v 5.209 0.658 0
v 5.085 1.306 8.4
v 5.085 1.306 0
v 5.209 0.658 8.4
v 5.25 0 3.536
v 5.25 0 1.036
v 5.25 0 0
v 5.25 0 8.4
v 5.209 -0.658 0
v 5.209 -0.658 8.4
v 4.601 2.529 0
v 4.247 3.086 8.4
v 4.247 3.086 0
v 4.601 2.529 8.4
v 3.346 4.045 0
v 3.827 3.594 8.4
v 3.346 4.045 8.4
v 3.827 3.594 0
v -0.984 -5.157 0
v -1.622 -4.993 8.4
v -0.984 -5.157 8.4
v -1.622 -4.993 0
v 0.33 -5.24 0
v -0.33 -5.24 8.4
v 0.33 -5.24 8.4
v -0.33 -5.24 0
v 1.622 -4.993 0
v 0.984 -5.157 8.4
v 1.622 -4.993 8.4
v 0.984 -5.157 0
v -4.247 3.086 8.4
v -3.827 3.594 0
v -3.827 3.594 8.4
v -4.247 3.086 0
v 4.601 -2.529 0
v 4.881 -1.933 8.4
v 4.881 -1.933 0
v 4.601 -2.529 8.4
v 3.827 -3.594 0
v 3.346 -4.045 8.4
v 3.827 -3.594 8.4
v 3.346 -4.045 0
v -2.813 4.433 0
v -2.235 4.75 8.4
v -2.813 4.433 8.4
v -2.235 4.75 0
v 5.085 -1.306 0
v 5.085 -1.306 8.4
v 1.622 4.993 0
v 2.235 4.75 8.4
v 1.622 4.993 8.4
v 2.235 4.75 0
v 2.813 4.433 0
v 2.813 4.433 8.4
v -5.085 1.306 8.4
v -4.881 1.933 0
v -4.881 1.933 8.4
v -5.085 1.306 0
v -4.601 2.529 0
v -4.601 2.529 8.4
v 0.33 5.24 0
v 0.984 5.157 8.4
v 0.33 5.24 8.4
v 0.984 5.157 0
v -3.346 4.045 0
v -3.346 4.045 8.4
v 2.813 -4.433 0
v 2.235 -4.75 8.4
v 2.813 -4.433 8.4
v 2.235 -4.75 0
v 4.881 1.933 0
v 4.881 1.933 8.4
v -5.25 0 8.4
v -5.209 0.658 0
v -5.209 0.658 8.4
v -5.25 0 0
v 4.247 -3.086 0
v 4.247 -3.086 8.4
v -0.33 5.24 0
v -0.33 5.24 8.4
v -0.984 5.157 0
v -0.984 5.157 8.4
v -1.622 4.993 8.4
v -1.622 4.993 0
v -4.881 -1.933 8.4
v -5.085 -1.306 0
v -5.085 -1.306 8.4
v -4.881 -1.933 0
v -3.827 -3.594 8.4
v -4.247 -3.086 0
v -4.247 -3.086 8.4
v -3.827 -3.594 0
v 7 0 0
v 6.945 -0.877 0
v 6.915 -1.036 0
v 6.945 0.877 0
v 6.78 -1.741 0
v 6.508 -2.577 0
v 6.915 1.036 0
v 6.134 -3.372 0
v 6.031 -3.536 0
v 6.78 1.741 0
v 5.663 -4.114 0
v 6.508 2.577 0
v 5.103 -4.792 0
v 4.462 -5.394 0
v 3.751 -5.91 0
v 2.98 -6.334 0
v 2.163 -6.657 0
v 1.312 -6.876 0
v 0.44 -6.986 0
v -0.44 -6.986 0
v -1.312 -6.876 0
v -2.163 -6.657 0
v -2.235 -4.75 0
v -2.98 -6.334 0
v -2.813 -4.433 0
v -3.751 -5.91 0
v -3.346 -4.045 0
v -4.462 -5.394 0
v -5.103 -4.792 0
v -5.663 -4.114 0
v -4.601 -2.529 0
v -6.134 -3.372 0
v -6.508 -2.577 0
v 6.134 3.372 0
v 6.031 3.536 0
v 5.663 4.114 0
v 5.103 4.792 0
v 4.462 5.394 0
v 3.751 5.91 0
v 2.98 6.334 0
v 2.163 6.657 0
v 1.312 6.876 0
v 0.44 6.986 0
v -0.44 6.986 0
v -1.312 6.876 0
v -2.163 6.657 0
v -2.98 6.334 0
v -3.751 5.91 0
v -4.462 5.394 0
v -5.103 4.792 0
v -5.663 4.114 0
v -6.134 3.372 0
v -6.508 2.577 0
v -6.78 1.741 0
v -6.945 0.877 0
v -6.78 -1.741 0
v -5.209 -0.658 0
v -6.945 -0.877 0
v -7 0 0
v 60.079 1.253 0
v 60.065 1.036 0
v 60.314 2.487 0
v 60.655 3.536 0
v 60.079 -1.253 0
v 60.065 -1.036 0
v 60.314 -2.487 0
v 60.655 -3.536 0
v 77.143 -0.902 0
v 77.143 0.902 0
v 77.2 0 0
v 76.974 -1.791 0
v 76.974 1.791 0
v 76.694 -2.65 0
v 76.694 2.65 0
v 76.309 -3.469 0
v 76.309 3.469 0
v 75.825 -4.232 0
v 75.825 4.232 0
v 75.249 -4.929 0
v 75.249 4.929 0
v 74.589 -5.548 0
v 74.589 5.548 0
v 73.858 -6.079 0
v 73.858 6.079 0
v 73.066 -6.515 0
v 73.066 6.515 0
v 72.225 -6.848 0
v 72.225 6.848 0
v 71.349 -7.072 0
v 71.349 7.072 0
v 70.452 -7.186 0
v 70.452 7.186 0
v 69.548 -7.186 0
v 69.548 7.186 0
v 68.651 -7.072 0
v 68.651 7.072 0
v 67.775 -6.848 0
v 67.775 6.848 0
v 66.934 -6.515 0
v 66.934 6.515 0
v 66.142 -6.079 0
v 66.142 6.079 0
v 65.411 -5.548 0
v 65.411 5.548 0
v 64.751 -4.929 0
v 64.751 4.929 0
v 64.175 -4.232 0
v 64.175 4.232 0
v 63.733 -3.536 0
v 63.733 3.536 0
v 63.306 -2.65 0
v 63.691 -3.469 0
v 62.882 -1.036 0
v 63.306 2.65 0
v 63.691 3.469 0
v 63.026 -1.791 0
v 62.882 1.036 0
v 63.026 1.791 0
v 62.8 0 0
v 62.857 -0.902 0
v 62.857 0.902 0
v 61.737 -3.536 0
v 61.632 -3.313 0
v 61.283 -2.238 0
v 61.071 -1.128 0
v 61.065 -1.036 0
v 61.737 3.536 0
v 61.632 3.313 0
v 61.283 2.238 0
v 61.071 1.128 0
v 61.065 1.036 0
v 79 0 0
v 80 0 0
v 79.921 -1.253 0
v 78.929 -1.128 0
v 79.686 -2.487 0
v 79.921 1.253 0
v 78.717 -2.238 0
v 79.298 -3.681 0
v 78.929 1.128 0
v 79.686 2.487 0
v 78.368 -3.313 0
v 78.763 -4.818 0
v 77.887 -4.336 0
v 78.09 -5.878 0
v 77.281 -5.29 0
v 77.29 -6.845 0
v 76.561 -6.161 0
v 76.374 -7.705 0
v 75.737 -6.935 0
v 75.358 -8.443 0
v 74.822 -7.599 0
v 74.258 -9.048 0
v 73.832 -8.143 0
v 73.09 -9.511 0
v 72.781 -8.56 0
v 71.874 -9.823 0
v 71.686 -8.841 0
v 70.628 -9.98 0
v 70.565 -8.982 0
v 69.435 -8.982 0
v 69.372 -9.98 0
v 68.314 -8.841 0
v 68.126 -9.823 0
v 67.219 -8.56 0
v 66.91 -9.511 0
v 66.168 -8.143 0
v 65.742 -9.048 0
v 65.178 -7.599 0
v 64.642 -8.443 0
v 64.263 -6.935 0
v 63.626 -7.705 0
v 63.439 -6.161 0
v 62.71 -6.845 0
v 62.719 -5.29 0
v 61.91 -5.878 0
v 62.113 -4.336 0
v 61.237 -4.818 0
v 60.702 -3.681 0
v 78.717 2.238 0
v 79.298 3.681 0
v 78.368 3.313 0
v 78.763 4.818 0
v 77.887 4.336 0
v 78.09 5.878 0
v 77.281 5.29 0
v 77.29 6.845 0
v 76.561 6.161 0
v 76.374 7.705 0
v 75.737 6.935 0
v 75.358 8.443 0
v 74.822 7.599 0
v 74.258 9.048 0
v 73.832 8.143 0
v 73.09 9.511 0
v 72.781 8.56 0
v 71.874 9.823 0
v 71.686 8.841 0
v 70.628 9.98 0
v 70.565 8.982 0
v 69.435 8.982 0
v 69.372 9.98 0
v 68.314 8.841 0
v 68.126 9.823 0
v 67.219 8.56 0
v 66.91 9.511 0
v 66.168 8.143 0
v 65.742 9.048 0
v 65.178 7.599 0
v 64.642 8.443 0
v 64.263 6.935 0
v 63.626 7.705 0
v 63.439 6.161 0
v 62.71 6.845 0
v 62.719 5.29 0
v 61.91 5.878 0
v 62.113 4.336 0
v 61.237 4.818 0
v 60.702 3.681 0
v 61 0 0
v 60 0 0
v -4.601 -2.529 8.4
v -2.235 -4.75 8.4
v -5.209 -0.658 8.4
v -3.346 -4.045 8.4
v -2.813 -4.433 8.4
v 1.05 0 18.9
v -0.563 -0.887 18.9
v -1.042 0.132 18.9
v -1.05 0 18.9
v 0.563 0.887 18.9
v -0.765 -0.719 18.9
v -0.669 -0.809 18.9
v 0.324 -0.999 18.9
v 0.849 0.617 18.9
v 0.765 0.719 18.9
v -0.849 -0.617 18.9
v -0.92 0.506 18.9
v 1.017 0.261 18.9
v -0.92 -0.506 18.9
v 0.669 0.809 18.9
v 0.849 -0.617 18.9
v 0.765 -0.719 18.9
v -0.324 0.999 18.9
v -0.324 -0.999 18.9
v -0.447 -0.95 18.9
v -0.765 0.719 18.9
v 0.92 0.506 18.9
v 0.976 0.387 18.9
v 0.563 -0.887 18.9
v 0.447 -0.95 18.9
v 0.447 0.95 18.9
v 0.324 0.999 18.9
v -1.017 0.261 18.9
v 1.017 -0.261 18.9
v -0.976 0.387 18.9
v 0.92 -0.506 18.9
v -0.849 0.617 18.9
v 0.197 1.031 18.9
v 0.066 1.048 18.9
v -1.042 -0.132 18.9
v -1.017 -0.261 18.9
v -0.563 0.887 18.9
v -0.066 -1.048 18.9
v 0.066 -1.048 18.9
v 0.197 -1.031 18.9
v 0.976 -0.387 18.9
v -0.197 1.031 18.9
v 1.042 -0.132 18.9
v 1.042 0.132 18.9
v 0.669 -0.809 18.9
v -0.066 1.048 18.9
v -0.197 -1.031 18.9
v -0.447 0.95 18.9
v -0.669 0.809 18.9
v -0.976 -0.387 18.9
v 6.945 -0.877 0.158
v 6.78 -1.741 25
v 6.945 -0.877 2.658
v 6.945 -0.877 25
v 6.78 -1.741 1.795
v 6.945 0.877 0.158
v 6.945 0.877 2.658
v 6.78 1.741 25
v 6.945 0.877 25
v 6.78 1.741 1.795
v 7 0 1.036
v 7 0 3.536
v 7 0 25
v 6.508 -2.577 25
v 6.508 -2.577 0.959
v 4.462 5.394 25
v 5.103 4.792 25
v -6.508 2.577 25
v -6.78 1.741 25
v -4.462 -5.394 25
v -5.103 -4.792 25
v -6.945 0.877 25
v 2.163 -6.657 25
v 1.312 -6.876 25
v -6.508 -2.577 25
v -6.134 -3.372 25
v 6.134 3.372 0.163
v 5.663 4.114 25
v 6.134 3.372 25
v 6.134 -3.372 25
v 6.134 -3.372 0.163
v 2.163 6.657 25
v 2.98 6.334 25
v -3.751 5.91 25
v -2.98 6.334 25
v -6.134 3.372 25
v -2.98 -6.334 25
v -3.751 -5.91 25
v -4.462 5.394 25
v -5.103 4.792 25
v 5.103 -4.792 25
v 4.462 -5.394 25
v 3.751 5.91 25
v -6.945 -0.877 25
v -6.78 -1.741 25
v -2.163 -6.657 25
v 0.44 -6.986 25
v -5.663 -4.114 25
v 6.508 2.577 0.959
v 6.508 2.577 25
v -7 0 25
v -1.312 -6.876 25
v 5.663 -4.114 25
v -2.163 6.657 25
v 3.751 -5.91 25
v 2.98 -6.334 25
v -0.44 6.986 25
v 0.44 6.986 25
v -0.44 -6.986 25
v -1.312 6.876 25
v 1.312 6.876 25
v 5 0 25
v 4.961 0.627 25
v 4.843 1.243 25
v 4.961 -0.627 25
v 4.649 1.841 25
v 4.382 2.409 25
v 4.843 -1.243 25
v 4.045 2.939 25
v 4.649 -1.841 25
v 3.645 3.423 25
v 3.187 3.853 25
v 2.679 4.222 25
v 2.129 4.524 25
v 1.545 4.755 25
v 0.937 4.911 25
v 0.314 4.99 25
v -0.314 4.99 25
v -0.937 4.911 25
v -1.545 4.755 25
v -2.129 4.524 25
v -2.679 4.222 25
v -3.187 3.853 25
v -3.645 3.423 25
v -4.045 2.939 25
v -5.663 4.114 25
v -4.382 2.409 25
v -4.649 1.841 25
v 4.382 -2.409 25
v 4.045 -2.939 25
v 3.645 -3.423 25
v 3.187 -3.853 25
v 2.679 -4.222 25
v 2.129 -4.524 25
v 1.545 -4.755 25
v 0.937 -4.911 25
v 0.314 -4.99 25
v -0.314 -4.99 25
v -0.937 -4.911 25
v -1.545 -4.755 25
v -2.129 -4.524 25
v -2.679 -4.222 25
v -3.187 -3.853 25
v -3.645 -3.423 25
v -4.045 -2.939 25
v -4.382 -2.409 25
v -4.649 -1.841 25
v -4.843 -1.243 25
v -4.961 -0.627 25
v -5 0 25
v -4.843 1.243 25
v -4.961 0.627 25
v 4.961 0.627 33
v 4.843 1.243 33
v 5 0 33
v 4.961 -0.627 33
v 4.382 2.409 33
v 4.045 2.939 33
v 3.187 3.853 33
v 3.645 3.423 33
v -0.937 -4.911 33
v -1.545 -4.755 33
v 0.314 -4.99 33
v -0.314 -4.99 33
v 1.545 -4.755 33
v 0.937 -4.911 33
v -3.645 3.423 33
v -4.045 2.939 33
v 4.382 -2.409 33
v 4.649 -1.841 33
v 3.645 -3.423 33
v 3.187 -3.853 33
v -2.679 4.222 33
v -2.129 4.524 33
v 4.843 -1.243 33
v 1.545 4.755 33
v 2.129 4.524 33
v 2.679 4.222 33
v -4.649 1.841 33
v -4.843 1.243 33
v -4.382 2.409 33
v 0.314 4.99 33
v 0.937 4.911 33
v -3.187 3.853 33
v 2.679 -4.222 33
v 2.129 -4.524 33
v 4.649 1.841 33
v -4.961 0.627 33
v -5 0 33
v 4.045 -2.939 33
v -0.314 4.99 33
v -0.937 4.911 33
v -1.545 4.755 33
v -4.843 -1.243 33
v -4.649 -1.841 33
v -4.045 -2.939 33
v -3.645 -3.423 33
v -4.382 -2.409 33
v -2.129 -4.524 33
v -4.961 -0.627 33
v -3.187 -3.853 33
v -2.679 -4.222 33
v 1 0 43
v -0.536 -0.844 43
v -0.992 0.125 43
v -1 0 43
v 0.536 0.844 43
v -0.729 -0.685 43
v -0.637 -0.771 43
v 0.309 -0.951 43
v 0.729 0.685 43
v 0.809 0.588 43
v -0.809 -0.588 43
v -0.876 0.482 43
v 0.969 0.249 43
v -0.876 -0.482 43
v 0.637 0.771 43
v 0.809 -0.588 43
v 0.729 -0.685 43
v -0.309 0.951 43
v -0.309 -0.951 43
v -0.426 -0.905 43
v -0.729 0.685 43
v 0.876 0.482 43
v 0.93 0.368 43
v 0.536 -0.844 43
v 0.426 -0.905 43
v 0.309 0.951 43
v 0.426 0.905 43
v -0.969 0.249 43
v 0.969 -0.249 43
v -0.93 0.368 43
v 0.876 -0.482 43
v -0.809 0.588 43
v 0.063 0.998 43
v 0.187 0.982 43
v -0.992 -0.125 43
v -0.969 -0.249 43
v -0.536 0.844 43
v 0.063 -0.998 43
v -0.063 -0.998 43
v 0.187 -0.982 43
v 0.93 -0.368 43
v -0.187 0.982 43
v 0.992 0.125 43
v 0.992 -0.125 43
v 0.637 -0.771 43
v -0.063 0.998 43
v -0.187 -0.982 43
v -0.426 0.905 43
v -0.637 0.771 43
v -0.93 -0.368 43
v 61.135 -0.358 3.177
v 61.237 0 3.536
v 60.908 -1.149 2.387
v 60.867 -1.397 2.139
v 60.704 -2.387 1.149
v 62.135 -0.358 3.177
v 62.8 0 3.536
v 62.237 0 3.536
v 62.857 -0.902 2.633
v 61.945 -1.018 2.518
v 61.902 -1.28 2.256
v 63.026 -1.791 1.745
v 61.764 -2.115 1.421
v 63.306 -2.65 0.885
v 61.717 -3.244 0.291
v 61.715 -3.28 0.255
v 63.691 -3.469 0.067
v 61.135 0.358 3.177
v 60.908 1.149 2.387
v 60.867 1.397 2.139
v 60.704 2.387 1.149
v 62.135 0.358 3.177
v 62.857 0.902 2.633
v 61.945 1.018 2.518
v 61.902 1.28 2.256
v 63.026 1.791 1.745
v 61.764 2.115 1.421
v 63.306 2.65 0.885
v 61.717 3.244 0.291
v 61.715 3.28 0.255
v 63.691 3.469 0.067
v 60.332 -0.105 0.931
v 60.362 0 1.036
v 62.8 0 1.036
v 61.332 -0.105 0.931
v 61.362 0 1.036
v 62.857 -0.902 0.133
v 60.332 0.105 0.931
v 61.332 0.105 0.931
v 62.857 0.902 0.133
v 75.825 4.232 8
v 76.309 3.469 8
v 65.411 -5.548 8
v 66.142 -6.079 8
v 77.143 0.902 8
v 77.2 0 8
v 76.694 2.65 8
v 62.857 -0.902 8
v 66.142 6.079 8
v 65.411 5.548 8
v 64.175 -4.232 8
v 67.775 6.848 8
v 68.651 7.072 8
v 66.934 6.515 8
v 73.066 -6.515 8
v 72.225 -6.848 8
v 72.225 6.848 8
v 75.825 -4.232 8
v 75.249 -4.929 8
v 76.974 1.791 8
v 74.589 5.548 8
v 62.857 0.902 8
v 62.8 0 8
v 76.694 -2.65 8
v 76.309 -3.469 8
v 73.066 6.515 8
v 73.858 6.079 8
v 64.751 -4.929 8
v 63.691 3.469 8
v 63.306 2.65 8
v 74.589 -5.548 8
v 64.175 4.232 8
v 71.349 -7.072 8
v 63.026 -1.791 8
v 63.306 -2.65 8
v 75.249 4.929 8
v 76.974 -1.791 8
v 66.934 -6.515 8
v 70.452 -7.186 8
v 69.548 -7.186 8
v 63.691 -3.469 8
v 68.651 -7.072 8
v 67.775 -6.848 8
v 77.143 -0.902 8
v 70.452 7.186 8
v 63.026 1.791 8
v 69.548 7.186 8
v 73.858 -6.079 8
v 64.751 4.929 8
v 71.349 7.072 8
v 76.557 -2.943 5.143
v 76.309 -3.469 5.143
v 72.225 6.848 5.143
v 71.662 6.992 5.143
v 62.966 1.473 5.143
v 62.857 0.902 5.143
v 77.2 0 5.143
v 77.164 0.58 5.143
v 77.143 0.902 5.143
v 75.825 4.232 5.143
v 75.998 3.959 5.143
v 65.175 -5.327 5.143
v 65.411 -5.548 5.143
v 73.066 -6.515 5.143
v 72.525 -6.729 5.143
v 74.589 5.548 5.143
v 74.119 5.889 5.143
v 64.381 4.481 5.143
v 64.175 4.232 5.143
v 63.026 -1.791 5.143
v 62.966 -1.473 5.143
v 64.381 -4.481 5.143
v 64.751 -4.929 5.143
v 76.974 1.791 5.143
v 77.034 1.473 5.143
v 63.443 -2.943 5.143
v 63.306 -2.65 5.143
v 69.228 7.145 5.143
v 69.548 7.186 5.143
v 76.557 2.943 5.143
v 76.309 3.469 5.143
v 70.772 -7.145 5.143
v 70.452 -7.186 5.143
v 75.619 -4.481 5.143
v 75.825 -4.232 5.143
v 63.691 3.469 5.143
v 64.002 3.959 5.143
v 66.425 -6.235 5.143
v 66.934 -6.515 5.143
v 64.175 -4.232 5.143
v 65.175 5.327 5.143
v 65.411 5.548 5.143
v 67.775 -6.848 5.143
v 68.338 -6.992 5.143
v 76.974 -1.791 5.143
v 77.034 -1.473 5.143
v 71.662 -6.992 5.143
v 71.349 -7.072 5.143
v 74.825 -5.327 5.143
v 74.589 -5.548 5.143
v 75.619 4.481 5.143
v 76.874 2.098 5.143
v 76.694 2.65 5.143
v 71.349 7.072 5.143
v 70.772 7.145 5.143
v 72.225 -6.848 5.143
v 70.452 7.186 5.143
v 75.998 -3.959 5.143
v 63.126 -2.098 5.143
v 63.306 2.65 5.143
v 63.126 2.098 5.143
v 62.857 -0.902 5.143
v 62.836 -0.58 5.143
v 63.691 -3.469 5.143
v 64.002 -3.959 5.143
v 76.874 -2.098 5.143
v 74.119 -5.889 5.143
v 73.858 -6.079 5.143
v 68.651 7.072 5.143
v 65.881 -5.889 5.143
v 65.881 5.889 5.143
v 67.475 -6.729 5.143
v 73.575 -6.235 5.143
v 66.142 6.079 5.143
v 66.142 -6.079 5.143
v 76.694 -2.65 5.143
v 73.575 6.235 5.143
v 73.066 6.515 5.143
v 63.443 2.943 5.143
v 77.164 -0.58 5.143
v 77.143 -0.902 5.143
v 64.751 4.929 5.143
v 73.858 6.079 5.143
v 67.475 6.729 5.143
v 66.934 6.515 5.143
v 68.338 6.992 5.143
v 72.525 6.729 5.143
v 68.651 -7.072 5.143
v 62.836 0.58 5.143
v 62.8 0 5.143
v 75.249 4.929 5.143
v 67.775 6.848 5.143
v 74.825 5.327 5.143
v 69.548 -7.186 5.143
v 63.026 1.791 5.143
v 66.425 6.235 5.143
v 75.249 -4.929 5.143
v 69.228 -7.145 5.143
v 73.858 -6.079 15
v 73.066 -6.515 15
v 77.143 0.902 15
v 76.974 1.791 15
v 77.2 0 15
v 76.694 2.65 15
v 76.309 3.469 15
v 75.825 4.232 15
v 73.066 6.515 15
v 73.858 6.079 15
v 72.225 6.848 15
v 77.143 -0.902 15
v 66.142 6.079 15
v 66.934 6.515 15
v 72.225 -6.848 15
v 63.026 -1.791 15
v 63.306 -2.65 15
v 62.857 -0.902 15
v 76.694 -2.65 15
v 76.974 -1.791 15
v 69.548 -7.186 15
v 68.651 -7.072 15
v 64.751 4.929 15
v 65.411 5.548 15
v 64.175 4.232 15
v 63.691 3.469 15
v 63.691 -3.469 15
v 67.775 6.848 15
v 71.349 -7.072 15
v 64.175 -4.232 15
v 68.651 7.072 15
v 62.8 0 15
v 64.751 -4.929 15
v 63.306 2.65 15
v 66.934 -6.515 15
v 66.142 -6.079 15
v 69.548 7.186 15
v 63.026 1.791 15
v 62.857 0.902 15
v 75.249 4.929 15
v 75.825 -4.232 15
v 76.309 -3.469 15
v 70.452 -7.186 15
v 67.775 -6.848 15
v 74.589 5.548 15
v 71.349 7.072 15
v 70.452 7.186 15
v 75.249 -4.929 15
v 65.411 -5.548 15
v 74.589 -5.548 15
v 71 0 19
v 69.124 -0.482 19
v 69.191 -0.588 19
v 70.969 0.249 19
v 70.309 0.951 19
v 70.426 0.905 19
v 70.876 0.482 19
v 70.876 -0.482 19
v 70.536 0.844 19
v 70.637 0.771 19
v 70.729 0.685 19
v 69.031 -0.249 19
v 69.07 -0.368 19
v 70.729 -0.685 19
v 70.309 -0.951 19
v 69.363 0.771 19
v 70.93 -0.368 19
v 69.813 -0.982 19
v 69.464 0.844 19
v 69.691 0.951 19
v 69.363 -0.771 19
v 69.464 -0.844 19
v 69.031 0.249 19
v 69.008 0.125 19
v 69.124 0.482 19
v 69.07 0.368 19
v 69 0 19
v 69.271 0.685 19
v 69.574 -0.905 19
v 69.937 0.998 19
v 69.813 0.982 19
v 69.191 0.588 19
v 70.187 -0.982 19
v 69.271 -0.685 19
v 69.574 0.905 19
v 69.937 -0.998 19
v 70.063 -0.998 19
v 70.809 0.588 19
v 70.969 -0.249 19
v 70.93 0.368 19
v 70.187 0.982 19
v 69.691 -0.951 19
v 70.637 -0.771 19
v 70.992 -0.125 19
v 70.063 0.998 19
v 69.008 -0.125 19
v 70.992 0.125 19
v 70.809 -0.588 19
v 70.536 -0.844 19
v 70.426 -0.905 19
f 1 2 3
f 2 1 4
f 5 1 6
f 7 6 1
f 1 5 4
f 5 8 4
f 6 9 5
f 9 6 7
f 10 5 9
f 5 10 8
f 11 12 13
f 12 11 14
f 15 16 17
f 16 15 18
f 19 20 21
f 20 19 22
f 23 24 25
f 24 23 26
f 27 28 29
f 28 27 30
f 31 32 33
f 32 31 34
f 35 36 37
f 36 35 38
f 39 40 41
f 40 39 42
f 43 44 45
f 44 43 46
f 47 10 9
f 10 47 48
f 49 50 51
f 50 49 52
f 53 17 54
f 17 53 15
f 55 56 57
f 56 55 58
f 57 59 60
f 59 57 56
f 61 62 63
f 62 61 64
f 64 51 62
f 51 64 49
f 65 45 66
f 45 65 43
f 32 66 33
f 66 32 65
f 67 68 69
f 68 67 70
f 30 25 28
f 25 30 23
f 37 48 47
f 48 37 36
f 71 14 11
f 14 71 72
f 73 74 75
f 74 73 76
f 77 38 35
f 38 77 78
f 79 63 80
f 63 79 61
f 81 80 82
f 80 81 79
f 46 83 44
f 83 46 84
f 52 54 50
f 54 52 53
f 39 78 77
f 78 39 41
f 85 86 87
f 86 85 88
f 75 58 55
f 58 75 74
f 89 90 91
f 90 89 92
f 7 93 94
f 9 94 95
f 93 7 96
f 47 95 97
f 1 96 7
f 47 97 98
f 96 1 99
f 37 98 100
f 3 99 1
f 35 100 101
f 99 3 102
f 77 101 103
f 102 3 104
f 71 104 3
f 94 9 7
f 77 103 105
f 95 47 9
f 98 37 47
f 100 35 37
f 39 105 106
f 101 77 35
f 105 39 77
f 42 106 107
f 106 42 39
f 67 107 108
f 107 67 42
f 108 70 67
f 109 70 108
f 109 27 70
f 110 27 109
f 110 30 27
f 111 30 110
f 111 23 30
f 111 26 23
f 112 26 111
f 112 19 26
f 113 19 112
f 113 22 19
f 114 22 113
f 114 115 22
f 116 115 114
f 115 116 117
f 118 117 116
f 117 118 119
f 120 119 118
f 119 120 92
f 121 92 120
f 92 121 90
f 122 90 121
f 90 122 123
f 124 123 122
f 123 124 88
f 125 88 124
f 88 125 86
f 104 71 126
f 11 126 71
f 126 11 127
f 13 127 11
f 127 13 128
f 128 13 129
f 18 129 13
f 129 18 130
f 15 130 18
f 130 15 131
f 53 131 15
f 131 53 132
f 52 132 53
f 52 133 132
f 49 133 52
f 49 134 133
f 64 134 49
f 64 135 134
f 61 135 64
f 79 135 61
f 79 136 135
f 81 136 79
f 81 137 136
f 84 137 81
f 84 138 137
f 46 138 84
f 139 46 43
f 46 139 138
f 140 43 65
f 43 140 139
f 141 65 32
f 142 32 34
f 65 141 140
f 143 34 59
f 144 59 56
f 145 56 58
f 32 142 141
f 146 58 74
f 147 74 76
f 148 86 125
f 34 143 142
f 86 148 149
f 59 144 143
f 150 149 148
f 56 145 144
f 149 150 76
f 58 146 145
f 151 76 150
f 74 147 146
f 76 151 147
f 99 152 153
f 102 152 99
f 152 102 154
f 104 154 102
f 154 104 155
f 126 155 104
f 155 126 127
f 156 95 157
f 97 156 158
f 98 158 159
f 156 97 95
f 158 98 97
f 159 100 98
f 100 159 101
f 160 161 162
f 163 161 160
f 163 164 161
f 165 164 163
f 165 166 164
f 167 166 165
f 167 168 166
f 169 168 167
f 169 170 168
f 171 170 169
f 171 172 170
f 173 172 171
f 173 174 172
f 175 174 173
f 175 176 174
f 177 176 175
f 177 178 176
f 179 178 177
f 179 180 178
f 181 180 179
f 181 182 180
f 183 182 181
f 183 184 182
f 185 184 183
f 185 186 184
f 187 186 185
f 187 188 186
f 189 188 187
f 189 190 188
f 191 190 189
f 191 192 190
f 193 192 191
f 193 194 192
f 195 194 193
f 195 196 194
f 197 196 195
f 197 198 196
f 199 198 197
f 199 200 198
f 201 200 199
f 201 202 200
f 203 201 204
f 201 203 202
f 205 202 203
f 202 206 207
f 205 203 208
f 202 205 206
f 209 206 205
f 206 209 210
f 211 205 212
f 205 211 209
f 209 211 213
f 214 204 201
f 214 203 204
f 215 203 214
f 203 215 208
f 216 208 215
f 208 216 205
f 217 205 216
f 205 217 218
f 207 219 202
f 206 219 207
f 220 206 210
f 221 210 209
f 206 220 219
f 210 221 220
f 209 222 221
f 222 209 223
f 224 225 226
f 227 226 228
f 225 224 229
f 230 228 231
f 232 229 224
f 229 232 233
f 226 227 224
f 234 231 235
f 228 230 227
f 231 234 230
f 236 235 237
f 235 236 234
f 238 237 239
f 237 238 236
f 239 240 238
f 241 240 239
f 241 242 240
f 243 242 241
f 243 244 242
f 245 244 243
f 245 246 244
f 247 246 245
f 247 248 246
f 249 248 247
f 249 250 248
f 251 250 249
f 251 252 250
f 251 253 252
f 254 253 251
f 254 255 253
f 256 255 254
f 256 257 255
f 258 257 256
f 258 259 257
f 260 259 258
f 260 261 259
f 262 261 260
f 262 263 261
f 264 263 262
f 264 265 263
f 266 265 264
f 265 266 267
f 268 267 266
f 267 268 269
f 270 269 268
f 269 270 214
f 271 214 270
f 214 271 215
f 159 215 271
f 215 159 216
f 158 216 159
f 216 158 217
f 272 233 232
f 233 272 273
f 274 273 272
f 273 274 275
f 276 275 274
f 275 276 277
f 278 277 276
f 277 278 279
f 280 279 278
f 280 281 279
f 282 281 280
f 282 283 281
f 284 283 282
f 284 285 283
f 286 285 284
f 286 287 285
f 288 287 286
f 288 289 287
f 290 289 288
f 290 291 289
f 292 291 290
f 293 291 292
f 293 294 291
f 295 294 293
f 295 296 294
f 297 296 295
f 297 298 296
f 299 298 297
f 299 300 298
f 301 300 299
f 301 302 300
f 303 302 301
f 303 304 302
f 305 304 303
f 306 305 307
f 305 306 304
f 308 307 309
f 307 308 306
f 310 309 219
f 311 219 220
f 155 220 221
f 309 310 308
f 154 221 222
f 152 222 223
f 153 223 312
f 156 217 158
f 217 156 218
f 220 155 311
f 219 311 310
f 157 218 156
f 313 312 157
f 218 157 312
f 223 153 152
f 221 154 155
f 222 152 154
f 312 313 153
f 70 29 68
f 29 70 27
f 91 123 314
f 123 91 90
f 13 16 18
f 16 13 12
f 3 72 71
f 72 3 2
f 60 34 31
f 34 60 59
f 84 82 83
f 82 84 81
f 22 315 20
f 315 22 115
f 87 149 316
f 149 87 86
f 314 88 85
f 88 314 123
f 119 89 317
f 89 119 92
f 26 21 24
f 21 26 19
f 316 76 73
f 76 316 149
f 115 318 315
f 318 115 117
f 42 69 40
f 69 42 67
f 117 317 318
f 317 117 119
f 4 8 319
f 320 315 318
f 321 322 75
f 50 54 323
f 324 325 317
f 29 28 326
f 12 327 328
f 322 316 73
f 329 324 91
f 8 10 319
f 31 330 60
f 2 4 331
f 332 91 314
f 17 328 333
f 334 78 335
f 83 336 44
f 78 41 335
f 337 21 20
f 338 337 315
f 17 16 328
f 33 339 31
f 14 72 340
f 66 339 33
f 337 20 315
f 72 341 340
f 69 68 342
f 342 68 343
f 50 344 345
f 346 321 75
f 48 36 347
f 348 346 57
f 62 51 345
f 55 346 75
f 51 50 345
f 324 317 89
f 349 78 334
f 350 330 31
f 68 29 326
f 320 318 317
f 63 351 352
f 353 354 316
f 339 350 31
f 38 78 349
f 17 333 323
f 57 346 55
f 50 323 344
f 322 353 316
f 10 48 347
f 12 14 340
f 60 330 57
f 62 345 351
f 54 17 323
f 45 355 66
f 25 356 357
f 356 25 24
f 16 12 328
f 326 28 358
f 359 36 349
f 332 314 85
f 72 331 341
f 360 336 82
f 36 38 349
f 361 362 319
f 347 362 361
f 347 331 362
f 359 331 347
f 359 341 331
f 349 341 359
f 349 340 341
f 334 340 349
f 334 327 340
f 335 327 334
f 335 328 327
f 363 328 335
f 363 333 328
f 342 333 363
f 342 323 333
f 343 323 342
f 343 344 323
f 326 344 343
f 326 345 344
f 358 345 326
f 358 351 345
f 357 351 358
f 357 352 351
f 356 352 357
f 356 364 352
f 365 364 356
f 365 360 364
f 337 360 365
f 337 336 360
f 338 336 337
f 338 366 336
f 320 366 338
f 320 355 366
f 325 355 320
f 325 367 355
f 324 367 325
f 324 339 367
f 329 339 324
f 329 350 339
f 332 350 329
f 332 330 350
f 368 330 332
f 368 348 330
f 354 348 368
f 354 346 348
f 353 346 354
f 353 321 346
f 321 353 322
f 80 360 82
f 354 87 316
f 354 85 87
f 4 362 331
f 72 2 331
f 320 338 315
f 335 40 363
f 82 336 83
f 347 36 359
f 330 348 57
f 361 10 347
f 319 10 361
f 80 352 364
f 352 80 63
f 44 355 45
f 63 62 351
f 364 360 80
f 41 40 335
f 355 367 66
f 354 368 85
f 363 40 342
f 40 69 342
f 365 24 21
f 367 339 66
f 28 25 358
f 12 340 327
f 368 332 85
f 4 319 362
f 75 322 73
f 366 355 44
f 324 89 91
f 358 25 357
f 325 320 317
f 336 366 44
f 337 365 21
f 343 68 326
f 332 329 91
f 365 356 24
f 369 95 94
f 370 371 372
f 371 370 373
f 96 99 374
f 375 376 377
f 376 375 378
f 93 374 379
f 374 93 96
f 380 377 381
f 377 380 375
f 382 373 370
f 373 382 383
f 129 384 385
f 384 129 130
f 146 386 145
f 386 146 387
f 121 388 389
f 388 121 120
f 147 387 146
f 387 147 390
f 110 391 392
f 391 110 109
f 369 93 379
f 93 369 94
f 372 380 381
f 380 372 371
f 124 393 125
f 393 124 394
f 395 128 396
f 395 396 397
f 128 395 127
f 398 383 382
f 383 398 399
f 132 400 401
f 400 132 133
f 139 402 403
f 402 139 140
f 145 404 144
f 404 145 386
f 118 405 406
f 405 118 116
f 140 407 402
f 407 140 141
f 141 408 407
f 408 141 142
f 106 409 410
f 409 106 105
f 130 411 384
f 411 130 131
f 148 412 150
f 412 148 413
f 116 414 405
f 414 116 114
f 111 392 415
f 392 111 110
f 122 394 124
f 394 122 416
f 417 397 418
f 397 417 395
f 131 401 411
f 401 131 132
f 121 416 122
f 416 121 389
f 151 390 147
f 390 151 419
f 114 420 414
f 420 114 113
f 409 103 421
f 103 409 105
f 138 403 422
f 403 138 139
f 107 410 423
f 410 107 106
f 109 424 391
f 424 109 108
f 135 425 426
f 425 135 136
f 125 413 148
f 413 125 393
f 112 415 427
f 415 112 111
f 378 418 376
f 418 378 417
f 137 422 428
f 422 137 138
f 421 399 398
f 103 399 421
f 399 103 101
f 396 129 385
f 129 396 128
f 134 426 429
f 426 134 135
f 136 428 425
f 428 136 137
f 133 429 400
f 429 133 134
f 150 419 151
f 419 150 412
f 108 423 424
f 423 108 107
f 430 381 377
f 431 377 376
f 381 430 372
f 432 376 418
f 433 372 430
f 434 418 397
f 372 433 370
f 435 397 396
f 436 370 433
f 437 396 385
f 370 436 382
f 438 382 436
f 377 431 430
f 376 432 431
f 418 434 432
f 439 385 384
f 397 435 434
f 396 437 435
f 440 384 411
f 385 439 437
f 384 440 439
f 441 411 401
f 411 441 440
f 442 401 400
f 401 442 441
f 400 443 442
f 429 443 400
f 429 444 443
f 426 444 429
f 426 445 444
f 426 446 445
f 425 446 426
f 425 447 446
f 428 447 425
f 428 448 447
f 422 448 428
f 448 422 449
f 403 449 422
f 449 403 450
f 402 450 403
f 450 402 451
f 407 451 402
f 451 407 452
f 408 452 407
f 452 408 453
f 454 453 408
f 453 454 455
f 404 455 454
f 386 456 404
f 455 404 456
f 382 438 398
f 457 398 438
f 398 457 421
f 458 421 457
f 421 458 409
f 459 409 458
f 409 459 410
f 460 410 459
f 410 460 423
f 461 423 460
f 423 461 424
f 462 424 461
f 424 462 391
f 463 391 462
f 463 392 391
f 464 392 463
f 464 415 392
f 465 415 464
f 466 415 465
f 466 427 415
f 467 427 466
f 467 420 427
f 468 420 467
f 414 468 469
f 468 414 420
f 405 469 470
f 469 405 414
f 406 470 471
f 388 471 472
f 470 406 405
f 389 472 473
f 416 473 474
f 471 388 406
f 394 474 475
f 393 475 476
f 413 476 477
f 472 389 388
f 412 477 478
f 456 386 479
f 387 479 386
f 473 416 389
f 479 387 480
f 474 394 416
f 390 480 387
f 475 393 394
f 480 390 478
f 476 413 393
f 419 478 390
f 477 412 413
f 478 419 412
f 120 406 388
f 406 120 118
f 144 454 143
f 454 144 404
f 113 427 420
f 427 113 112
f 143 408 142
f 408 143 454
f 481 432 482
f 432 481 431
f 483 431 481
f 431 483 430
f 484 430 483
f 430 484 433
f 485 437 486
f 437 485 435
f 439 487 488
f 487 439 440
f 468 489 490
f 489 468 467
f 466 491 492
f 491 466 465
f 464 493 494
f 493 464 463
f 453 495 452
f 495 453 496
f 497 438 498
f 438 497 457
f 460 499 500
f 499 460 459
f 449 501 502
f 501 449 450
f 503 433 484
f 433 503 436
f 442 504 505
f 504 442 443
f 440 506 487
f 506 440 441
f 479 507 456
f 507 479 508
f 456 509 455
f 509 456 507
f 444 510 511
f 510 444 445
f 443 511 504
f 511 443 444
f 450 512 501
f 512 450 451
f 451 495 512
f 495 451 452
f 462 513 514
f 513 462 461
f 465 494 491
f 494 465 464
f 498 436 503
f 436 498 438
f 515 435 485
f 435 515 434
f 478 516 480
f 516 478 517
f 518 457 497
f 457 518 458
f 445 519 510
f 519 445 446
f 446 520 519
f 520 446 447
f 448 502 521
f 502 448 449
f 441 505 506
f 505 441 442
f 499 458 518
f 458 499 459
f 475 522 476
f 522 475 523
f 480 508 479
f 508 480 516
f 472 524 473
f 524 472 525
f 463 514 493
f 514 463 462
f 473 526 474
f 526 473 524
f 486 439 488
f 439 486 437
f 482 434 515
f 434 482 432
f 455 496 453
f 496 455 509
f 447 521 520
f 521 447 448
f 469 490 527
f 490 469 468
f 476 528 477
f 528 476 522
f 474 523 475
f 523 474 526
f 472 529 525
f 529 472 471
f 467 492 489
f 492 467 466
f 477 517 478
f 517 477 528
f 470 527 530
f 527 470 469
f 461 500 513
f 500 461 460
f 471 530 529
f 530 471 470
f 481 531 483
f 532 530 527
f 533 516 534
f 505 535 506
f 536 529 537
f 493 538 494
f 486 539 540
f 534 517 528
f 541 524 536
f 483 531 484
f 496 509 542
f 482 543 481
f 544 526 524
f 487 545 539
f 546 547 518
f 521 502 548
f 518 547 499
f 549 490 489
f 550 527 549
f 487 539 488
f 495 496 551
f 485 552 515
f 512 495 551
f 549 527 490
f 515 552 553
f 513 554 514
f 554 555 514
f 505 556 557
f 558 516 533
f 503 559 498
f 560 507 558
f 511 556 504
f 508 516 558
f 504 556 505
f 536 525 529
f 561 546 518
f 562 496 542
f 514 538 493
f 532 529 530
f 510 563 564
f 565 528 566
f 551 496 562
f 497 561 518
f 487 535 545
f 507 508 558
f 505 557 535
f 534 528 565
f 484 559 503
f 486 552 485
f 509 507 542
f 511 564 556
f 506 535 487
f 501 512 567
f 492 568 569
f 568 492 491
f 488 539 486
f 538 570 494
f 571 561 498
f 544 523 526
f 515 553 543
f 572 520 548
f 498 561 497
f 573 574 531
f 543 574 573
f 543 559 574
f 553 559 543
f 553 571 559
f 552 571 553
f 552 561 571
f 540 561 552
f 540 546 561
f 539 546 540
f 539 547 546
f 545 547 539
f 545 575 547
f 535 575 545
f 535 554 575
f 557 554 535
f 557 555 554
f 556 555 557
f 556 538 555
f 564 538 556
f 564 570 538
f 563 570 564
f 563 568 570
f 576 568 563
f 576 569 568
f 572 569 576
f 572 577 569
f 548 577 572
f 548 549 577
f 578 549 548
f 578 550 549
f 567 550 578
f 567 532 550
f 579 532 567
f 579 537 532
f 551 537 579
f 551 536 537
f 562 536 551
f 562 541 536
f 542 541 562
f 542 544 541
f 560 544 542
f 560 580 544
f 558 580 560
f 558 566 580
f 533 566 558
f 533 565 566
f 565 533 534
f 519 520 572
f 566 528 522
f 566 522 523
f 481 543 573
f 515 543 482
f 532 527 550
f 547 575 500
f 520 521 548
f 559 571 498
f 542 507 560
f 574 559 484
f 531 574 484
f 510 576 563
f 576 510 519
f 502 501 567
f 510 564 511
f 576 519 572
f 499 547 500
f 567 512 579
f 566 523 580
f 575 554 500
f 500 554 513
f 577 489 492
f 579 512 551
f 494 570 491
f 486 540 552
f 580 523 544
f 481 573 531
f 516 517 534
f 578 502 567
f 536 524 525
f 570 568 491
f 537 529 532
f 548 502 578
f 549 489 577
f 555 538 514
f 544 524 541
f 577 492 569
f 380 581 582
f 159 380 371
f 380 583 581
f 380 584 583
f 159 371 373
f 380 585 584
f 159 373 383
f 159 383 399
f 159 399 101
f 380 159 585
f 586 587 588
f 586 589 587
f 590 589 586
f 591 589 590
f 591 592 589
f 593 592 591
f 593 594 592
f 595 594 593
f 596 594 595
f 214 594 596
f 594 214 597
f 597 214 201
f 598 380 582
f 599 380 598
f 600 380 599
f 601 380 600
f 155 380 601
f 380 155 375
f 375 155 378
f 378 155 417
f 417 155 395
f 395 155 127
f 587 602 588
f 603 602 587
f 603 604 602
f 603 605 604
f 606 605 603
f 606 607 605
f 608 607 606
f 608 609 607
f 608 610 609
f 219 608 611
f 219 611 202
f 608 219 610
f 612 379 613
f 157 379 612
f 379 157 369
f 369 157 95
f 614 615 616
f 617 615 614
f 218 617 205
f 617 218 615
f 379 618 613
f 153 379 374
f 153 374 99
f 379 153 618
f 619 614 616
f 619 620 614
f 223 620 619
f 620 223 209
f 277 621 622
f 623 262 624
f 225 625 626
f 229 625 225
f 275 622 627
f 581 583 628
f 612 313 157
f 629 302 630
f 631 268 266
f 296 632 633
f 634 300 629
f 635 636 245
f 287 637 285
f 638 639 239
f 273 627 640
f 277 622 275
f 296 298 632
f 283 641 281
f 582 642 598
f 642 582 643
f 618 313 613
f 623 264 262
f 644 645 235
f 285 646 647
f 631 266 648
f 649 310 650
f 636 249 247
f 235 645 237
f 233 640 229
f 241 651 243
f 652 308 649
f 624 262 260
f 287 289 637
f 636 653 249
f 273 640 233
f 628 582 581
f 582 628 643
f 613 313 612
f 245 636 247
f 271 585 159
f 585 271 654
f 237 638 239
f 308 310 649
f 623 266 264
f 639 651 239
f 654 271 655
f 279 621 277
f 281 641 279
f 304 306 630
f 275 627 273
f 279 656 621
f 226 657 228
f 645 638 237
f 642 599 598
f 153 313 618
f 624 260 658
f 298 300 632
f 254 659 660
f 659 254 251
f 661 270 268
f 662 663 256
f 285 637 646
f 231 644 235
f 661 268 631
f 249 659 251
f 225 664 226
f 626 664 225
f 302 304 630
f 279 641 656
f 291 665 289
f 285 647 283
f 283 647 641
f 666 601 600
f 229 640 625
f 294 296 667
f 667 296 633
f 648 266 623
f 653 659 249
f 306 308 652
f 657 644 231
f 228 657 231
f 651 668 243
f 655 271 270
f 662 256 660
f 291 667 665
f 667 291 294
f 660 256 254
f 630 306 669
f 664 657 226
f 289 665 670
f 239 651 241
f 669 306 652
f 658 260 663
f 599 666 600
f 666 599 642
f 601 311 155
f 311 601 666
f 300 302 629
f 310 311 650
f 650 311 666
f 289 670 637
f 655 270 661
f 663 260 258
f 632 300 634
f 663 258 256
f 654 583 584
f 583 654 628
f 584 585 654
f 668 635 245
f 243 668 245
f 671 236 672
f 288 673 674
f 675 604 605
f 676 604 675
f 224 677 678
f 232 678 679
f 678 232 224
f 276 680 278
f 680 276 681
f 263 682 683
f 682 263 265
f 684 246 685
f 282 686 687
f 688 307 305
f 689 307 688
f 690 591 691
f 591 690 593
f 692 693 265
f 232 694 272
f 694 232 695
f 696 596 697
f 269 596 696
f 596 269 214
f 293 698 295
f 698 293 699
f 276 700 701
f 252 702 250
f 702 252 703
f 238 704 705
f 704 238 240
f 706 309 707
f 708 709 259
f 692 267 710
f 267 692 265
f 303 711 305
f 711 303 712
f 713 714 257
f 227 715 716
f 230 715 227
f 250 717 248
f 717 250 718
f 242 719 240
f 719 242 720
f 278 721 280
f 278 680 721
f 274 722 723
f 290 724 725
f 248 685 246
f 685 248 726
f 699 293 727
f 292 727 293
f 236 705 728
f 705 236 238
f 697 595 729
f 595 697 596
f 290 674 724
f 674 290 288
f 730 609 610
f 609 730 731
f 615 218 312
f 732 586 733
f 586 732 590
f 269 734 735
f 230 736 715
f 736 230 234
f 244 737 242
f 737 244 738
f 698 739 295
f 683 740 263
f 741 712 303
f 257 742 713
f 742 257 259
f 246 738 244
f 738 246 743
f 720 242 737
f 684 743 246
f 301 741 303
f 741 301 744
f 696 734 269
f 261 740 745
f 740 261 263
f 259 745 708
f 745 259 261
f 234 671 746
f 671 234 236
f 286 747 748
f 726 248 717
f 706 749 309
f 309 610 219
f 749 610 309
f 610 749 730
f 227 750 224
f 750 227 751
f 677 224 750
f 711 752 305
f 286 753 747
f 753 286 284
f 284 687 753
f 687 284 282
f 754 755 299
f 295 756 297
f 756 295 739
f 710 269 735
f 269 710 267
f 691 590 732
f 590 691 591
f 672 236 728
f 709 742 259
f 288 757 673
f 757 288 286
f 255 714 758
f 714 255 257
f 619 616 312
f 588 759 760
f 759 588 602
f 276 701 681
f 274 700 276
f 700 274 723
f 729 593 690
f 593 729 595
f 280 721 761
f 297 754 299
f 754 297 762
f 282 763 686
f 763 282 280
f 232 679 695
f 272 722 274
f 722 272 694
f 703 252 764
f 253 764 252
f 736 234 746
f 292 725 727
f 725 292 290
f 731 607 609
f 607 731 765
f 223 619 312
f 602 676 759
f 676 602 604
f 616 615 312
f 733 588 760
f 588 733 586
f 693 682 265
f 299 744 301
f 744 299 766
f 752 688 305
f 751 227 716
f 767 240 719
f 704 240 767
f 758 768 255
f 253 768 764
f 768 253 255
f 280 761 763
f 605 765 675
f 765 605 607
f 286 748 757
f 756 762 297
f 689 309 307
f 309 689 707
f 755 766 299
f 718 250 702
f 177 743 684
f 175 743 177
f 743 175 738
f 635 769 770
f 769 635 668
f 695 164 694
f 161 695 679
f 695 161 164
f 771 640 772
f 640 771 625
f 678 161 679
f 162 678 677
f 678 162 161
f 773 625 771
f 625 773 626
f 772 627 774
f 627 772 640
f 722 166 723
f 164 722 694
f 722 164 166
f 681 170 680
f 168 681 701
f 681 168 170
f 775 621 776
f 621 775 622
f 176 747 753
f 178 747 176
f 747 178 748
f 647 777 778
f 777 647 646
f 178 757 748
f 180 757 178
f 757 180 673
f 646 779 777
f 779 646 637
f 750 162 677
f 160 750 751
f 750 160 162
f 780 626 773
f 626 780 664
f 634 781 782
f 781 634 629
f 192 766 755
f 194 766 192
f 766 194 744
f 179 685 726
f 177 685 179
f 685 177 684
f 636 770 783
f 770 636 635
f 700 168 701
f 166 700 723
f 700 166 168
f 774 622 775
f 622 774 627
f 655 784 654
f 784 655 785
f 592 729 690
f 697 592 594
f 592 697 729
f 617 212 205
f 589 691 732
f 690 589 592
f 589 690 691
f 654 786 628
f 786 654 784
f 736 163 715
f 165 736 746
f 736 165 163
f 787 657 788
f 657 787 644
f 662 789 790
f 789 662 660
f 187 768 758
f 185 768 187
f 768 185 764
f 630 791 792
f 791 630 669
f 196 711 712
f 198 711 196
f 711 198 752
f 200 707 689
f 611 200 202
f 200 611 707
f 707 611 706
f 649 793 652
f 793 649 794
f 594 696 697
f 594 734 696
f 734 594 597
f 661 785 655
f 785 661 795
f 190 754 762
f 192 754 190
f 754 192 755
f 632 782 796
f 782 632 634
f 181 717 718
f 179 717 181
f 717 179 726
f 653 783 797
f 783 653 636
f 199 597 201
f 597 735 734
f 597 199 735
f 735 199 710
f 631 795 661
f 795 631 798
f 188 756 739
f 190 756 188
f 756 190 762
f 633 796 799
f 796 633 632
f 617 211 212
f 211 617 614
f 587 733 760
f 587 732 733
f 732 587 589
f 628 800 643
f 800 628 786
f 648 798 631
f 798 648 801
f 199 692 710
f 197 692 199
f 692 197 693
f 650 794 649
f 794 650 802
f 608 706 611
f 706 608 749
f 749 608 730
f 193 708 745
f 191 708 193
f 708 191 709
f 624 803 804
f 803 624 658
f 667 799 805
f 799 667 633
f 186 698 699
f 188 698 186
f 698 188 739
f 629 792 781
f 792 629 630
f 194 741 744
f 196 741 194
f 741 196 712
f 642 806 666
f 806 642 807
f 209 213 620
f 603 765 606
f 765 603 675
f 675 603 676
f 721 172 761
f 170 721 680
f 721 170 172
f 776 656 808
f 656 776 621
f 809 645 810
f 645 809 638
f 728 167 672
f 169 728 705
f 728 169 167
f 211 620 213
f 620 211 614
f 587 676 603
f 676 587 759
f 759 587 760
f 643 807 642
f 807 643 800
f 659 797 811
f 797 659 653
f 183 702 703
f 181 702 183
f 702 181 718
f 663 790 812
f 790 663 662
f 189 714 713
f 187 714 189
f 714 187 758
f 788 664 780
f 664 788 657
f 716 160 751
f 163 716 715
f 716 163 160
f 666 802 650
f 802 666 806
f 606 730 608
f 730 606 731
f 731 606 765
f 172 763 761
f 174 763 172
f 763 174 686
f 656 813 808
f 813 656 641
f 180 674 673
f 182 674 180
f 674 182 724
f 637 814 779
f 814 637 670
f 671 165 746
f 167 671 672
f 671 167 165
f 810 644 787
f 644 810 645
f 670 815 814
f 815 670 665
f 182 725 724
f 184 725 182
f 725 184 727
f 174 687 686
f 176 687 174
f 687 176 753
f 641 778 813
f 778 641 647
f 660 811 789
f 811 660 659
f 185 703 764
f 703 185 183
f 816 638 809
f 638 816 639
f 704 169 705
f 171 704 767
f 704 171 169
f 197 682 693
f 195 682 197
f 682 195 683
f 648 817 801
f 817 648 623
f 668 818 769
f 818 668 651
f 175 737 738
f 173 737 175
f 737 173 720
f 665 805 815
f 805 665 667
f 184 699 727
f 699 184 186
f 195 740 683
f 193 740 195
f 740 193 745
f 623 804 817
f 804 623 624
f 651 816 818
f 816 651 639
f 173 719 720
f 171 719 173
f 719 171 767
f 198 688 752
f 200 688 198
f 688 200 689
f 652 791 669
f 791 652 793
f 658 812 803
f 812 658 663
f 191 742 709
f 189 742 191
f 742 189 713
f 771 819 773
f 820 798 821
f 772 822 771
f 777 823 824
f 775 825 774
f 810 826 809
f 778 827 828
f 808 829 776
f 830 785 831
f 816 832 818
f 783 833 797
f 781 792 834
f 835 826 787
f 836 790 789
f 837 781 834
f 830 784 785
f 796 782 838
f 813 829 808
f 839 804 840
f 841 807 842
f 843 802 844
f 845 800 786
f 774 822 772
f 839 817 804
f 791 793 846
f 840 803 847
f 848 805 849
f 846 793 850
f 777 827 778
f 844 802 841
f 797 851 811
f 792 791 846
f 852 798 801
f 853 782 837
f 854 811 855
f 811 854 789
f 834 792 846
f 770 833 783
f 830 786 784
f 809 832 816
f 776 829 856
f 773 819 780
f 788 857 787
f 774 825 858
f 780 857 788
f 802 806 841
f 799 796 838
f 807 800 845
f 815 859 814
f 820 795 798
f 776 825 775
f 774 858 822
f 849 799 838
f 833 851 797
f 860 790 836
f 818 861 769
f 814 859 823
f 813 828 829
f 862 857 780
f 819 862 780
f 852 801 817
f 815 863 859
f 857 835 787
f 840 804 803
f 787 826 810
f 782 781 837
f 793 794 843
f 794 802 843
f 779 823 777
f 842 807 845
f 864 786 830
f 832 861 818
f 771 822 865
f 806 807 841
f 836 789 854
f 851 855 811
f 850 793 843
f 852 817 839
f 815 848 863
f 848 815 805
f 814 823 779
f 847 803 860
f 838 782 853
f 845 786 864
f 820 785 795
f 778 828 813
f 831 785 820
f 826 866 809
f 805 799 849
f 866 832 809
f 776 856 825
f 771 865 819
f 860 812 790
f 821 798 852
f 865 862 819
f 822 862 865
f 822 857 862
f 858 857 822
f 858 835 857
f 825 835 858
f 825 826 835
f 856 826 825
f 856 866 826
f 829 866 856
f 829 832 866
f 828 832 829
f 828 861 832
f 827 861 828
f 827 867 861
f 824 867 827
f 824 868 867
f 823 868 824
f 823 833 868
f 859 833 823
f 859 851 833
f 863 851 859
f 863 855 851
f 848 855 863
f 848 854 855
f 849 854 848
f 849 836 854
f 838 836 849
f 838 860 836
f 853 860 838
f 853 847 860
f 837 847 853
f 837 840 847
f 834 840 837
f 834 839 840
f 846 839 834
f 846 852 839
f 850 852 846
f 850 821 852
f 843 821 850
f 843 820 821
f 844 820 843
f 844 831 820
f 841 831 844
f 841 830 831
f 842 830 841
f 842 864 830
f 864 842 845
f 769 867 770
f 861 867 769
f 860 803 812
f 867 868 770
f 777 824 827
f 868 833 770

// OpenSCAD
/* [General] */
partToMake = 0; //[0:CD Holder, 1:Foot]
tolerance = 1.05;
resolution = 50; //[4:100]

/* [Stackable] */
baseHeight = 25; //[10:100]
baseWidth = 7; //[3:20]

topHeight = 8; //[2:20]
topWidth = 5; //[2:20]
topConeHeight = 10; //[0:20]

/* [Foot] */
feetNum = 5; //[3:10]
feetWidth = 3; //[1:10]
feetLength = 22; //[5:50]
footHeight = 5; //[1:10]
footWidth = 11; //[0:40]

/* [Shaft] */
shaftLength = 70; //[30:200]
shaftWidth = 5; //[2:20]

/* [CD holder] */
cdPoleRadius = 7.2;
cdPoleHeight = 15; //[5:50]
cdPoleHatHeight = 4; //[0:10]
cdBaseWidth = 10; //[0:30]
cdBaseHeight = 8; //[0:50]

/* [Hidden] */
$fn = resolution;

module top()
{
	//Create top cylinder
	
	cylinder(h=topHeight, r=topWidth);
	
	//Create a cone at the very top
	translate([0, 0, topHeight])
		cylinder(topConeHeight, topWidth);
}

module stackable()
{
	difference()
	{
		cylinder(h=baseHeight, r=baseWidth); //Base-cylinder

		scale(tolerance, tolerance, tolerance) //Scale the top-hole using tolerance
			top(); //Cut a top-shaped hole in the base
	}

	translate([0, 0, baseHeight]) top(); //Add the top, on top of the base
}

module foot()
{
	stackable();
	
	for(i = [0:feetNum])
	{
		rotate(i*(360/feetNum), [0, 0, 1])
		{
			translate([feetLength/2+topWidth, 0, feetWidth/2])
				cube([feetLength, feetWidth, feetWidth], center = true);
			
			translate([feetLength+topWidth, 0, 0])
				cylinder(footHeight, footWidth);
		}
	}
}

module shaft()
{
	difference()
	{
		translate([0, 0, -shaftWidth/2])
			rotate(45, [1, 0, 0])
				cube([shaftLength, shaftWidth, shaftWidth], center = true);
				
		translate([0, 0, -shaftWidth])
			rotate(45, [1, 0, 0])
				cube([shaftLength, shaftWidth, shaftWidth], center = true);
		
		translate([0, 0, -shaftWidth])
			cube([shaftLength, shaftWidth*2, shaftWidth], center = true);
	}
	
}

module cdPole()
{	
	difference()
	{
		cylinder(cdBaseHeight, cdBaseWidth, cdPoleRadius); //CD base cone
		scale(0.9, 0.9, 0.9) cylinder(cdBaseHeight, cdBaseWidth, cdPoleRadius); //CD base cone
	}
	
	cylinder(h=cdPoleHeight, r=cdPoleRadius); //CD pole
	
	translate([0, 0, cdPoleHeight])
		cylinder(cdPoleHatHeight, cdPoleRadius); //CD top cone
}


if( partToMake == 1 )
{
	foot();
}
else
{
	stackable();
	translate([shaftLength/2+topWidth*tolerance, 0, shaftWidth/2]) shaft();
	translate([shaftLength, 0, 0]) cdPole();
}
